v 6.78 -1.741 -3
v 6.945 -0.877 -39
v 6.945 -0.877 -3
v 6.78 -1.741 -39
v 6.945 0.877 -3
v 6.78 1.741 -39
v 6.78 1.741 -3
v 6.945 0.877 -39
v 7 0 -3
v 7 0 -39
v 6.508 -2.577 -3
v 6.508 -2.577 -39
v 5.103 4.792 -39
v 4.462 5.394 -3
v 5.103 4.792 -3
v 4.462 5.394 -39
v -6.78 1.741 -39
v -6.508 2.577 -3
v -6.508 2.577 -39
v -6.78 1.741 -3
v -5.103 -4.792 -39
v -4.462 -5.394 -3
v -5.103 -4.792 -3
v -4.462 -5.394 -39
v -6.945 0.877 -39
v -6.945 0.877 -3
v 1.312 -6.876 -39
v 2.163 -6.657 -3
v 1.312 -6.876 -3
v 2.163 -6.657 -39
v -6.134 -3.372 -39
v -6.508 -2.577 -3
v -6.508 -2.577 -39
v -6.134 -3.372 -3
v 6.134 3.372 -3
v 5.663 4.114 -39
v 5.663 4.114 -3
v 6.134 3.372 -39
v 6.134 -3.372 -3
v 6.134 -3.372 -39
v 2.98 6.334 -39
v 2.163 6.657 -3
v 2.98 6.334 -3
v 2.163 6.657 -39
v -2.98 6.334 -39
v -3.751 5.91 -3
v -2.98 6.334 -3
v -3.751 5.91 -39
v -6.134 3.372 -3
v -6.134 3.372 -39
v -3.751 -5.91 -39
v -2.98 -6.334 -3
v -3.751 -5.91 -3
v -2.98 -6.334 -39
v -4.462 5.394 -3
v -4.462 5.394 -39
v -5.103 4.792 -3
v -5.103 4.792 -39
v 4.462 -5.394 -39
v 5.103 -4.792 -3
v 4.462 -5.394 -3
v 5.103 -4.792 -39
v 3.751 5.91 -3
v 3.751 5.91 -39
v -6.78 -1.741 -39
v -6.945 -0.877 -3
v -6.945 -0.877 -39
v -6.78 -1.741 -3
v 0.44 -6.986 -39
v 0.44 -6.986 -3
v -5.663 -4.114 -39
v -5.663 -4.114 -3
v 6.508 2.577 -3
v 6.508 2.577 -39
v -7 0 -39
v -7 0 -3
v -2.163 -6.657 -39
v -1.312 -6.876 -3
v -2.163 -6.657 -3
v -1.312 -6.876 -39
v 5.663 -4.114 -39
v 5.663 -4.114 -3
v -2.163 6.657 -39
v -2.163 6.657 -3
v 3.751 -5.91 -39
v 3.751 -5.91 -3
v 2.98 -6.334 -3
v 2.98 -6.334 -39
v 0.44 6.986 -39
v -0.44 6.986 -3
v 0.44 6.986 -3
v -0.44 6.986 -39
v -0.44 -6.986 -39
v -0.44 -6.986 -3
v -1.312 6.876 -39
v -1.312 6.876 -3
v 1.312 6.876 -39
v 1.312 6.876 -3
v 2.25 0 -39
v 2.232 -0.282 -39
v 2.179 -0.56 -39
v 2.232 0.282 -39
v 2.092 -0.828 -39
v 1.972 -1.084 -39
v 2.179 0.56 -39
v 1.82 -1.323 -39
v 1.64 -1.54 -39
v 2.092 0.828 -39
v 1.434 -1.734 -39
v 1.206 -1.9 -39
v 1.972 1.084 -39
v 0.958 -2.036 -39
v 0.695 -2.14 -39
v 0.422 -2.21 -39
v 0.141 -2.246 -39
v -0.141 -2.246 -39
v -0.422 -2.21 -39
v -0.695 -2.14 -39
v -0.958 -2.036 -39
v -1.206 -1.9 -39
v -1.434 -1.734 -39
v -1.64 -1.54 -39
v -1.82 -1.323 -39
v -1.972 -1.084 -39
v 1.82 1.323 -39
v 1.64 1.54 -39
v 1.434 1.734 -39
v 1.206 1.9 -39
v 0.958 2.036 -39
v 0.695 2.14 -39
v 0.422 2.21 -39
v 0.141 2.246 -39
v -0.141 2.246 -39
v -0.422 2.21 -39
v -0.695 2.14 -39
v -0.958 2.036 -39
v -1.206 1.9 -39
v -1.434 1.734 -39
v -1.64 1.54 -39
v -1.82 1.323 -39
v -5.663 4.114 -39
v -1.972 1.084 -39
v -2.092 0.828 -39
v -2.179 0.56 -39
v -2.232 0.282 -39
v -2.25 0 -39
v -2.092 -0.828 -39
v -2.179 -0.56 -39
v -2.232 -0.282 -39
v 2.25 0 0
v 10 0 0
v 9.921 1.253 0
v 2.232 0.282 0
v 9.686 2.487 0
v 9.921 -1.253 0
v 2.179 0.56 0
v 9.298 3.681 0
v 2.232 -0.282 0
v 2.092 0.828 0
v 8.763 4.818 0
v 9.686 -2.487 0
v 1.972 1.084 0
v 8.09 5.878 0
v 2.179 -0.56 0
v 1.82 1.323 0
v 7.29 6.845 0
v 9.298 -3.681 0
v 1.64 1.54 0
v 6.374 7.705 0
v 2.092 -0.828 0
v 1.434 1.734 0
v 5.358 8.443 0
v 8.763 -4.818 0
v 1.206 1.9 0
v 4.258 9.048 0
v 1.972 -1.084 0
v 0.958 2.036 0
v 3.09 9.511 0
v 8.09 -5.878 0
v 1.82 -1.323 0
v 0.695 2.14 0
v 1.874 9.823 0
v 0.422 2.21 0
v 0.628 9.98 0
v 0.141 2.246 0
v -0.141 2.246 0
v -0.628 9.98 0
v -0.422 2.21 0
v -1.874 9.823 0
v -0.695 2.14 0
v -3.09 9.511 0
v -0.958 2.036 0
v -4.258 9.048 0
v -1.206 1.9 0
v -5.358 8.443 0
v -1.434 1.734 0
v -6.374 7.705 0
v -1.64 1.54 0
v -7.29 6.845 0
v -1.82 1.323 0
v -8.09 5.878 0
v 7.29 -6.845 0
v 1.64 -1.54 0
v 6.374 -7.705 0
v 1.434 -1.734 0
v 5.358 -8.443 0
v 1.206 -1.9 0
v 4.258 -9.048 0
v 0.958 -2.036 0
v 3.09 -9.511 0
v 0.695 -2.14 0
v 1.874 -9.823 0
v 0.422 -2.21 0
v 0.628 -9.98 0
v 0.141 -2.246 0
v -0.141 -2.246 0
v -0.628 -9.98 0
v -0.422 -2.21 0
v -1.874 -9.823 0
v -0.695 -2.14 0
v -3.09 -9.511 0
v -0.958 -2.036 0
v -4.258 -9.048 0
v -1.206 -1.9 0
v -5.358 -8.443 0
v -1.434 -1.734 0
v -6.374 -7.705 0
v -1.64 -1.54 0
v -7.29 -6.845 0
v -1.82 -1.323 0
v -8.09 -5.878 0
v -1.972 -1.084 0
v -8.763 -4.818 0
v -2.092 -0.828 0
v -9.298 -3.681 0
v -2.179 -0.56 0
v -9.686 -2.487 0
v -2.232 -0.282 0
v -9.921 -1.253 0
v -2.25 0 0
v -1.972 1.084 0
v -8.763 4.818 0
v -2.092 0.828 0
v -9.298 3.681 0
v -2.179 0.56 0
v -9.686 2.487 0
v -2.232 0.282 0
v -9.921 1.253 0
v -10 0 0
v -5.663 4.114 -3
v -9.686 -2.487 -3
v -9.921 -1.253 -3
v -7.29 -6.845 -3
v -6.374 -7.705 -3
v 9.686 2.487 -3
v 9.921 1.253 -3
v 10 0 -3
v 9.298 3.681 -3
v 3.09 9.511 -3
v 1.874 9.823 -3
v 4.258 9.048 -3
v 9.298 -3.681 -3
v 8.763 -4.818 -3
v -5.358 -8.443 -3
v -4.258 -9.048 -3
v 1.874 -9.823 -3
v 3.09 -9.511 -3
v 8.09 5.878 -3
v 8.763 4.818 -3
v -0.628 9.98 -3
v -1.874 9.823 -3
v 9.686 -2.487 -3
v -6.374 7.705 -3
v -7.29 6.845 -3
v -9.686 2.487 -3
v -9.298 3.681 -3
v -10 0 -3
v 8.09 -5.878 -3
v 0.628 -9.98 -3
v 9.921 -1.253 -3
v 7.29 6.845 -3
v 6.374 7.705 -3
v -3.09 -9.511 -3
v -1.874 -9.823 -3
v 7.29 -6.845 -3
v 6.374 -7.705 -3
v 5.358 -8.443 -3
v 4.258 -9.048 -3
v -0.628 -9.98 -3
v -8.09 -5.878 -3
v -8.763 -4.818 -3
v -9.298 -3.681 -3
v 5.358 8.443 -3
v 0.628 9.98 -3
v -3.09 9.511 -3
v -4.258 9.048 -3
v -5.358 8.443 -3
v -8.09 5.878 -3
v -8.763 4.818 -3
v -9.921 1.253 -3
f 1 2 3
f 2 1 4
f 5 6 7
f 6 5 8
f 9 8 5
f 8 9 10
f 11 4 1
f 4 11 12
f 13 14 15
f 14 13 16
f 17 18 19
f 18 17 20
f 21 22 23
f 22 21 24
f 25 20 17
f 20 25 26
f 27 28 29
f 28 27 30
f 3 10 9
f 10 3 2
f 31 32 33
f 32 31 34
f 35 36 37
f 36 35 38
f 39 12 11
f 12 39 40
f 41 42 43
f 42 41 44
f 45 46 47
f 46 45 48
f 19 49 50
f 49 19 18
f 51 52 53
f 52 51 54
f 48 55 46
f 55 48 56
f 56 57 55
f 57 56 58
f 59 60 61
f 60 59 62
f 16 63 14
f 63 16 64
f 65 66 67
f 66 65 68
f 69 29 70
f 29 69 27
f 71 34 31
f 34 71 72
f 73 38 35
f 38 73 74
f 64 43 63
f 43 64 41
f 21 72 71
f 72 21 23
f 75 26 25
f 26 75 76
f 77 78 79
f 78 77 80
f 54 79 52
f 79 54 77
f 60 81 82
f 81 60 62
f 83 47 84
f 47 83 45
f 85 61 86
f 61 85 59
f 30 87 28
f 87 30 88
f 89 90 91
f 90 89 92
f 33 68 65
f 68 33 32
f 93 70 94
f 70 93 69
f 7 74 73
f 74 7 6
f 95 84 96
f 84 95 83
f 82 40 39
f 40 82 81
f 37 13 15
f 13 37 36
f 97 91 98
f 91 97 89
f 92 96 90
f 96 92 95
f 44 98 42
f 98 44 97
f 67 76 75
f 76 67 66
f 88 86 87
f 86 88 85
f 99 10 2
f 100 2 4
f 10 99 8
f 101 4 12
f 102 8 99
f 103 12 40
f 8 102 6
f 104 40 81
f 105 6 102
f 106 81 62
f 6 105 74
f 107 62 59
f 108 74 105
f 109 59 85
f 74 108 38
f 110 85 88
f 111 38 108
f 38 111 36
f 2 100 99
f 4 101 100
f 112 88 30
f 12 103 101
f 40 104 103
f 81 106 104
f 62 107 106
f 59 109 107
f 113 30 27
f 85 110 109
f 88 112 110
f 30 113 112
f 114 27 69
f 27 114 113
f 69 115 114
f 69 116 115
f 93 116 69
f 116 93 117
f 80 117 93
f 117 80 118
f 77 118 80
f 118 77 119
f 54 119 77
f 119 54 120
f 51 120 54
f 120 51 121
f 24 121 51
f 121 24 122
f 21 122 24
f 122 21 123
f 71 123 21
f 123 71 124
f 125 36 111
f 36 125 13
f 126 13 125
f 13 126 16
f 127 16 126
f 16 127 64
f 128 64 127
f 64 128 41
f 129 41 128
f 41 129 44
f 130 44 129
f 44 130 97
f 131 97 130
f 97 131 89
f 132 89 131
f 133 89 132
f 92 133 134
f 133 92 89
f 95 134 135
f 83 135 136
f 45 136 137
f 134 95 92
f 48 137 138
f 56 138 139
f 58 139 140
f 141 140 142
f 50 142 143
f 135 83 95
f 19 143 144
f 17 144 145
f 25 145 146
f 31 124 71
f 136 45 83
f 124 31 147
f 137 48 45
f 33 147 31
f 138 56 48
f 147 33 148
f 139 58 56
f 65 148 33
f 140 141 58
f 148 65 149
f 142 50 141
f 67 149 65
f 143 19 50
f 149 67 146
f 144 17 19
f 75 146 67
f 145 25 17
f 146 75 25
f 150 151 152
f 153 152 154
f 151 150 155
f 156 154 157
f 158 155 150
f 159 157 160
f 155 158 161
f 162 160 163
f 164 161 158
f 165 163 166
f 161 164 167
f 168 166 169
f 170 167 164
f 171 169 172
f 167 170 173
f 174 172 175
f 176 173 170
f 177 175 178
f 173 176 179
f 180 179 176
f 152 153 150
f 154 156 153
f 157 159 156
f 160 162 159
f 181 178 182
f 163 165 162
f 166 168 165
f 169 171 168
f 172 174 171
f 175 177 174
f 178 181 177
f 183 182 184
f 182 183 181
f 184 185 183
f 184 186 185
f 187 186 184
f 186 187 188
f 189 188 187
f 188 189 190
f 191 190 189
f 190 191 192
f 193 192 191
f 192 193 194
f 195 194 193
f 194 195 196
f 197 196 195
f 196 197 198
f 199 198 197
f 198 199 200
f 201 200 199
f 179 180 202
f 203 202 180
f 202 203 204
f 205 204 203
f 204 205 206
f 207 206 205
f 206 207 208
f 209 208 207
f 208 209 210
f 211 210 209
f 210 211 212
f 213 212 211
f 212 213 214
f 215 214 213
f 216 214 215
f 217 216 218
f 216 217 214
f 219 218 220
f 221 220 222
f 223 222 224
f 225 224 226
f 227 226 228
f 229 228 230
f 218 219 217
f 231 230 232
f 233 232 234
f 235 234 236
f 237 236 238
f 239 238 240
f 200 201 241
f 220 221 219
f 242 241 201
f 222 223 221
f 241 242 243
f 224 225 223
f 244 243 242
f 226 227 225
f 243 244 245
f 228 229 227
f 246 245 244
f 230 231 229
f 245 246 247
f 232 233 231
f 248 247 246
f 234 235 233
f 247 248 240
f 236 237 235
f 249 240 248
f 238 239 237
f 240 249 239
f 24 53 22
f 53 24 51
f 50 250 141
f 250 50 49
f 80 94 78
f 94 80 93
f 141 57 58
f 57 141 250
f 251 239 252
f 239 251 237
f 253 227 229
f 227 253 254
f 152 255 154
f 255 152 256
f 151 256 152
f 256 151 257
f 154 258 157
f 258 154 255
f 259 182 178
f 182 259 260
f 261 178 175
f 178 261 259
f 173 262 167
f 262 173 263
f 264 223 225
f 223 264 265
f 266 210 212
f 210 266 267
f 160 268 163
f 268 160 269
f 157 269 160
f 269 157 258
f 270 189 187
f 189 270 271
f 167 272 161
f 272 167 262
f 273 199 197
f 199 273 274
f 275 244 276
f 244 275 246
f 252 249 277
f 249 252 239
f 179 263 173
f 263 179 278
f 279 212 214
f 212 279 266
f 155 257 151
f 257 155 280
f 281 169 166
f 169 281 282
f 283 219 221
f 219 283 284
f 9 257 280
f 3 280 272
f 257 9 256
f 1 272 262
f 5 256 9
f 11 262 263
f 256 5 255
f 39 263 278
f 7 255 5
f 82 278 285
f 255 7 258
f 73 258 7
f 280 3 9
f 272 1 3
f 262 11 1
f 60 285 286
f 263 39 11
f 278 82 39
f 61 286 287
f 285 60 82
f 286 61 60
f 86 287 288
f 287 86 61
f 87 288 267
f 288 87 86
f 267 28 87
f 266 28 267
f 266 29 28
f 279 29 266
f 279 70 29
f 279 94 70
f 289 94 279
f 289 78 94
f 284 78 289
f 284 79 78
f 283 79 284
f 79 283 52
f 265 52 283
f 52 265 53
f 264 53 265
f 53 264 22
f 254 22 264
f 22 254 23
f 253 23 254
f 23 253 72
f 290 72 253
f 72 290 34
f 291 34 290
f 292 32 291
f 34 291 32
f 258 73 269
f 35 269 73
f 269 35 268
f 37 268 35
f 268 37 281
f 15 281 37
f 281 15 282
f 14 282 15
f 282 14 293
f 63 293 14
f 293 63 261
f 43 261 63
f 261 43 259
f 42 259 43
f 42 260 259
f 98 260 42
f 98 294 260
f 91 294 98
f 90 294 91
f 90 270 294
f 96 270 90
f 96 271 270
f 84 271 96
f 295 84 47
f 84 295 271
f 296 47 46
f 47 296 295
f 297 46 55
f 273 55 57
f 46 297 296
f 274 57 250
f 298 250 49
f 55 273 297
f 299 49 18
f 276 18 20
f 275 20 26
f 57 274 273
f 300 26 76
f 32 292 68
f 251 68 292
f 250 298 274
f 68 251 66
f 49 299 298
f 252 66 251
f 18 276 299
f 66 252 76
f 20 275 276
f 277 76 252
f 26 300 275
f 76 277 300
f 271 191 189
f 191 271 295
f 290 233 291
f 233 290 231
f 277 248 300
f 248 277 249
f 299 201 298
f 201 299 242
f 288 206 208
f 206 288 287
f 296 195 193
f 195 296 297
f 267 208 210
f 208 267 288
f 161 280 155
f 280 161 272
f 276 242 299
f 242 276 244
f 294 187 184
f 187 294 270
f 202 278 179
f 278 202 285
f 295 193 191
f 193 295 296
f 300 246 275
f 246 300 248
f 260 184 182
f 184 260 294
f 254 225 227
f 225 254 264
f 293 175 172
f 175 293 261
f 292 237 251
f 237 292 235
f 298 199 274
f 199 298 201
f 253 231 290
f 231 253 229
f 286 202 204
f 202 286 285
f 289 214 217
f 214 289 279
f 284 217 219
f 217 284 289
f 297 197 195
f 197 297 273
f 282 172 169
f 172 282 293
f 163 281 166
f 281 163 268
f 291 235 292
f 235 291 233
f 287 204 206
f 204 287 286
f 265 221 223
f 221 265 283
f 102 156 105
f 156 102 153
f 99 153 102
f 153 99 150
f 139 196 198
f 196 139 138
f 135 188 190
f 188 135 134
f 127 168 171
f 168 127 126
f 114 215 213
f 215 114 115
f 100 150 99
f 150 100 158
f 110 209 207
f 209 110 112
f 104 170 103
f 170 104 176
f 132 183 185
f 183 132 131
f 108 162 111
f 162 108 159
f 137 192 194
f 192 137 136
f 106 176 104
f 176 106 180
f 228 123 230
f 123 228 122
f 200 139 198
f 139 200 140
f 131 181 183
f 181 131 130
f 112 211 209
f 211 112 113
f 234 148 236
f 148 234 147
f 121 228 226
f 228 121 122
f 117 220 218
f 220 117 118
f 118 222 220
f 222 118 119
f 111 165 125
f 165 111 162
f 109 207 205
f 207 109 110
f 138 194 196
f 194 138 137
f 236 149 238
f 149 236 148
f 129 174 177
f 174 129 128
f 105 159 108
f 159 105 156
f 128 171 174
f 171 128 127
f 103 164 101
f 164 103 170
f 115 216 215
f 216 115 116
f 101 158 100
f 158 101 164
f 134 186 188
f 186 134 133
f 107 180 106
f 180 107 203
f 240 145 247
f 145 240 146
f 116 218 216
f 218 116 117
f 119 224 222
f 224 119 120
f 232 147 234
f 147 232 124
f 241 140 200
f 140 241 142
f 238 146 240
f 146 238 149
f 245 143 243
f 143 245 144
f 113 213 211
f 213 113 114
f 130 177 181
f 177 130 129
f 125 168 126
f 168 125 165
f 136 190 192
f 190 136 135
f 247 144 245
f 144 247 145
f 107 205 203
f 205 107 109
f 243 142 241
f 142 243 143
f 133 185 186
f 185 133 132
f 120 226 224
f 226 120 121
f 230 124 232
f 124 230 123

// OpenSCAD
$fn = 50;


difference() {
	union() {
		translate(v = [0, 0, -39.0000000000]) {
			cylinder(h = 39, r = 7.0000000000);
		}
		translate(v = [0, 0, -3.0000000000]) {
			cylinder(h = 3, r = 10.0000000000);
		}
	}
	union() {
		#translate(v = [0, 0, -39]) {
			cylinder(h = 39, r = 2.2500000000);
		}
	}
}
